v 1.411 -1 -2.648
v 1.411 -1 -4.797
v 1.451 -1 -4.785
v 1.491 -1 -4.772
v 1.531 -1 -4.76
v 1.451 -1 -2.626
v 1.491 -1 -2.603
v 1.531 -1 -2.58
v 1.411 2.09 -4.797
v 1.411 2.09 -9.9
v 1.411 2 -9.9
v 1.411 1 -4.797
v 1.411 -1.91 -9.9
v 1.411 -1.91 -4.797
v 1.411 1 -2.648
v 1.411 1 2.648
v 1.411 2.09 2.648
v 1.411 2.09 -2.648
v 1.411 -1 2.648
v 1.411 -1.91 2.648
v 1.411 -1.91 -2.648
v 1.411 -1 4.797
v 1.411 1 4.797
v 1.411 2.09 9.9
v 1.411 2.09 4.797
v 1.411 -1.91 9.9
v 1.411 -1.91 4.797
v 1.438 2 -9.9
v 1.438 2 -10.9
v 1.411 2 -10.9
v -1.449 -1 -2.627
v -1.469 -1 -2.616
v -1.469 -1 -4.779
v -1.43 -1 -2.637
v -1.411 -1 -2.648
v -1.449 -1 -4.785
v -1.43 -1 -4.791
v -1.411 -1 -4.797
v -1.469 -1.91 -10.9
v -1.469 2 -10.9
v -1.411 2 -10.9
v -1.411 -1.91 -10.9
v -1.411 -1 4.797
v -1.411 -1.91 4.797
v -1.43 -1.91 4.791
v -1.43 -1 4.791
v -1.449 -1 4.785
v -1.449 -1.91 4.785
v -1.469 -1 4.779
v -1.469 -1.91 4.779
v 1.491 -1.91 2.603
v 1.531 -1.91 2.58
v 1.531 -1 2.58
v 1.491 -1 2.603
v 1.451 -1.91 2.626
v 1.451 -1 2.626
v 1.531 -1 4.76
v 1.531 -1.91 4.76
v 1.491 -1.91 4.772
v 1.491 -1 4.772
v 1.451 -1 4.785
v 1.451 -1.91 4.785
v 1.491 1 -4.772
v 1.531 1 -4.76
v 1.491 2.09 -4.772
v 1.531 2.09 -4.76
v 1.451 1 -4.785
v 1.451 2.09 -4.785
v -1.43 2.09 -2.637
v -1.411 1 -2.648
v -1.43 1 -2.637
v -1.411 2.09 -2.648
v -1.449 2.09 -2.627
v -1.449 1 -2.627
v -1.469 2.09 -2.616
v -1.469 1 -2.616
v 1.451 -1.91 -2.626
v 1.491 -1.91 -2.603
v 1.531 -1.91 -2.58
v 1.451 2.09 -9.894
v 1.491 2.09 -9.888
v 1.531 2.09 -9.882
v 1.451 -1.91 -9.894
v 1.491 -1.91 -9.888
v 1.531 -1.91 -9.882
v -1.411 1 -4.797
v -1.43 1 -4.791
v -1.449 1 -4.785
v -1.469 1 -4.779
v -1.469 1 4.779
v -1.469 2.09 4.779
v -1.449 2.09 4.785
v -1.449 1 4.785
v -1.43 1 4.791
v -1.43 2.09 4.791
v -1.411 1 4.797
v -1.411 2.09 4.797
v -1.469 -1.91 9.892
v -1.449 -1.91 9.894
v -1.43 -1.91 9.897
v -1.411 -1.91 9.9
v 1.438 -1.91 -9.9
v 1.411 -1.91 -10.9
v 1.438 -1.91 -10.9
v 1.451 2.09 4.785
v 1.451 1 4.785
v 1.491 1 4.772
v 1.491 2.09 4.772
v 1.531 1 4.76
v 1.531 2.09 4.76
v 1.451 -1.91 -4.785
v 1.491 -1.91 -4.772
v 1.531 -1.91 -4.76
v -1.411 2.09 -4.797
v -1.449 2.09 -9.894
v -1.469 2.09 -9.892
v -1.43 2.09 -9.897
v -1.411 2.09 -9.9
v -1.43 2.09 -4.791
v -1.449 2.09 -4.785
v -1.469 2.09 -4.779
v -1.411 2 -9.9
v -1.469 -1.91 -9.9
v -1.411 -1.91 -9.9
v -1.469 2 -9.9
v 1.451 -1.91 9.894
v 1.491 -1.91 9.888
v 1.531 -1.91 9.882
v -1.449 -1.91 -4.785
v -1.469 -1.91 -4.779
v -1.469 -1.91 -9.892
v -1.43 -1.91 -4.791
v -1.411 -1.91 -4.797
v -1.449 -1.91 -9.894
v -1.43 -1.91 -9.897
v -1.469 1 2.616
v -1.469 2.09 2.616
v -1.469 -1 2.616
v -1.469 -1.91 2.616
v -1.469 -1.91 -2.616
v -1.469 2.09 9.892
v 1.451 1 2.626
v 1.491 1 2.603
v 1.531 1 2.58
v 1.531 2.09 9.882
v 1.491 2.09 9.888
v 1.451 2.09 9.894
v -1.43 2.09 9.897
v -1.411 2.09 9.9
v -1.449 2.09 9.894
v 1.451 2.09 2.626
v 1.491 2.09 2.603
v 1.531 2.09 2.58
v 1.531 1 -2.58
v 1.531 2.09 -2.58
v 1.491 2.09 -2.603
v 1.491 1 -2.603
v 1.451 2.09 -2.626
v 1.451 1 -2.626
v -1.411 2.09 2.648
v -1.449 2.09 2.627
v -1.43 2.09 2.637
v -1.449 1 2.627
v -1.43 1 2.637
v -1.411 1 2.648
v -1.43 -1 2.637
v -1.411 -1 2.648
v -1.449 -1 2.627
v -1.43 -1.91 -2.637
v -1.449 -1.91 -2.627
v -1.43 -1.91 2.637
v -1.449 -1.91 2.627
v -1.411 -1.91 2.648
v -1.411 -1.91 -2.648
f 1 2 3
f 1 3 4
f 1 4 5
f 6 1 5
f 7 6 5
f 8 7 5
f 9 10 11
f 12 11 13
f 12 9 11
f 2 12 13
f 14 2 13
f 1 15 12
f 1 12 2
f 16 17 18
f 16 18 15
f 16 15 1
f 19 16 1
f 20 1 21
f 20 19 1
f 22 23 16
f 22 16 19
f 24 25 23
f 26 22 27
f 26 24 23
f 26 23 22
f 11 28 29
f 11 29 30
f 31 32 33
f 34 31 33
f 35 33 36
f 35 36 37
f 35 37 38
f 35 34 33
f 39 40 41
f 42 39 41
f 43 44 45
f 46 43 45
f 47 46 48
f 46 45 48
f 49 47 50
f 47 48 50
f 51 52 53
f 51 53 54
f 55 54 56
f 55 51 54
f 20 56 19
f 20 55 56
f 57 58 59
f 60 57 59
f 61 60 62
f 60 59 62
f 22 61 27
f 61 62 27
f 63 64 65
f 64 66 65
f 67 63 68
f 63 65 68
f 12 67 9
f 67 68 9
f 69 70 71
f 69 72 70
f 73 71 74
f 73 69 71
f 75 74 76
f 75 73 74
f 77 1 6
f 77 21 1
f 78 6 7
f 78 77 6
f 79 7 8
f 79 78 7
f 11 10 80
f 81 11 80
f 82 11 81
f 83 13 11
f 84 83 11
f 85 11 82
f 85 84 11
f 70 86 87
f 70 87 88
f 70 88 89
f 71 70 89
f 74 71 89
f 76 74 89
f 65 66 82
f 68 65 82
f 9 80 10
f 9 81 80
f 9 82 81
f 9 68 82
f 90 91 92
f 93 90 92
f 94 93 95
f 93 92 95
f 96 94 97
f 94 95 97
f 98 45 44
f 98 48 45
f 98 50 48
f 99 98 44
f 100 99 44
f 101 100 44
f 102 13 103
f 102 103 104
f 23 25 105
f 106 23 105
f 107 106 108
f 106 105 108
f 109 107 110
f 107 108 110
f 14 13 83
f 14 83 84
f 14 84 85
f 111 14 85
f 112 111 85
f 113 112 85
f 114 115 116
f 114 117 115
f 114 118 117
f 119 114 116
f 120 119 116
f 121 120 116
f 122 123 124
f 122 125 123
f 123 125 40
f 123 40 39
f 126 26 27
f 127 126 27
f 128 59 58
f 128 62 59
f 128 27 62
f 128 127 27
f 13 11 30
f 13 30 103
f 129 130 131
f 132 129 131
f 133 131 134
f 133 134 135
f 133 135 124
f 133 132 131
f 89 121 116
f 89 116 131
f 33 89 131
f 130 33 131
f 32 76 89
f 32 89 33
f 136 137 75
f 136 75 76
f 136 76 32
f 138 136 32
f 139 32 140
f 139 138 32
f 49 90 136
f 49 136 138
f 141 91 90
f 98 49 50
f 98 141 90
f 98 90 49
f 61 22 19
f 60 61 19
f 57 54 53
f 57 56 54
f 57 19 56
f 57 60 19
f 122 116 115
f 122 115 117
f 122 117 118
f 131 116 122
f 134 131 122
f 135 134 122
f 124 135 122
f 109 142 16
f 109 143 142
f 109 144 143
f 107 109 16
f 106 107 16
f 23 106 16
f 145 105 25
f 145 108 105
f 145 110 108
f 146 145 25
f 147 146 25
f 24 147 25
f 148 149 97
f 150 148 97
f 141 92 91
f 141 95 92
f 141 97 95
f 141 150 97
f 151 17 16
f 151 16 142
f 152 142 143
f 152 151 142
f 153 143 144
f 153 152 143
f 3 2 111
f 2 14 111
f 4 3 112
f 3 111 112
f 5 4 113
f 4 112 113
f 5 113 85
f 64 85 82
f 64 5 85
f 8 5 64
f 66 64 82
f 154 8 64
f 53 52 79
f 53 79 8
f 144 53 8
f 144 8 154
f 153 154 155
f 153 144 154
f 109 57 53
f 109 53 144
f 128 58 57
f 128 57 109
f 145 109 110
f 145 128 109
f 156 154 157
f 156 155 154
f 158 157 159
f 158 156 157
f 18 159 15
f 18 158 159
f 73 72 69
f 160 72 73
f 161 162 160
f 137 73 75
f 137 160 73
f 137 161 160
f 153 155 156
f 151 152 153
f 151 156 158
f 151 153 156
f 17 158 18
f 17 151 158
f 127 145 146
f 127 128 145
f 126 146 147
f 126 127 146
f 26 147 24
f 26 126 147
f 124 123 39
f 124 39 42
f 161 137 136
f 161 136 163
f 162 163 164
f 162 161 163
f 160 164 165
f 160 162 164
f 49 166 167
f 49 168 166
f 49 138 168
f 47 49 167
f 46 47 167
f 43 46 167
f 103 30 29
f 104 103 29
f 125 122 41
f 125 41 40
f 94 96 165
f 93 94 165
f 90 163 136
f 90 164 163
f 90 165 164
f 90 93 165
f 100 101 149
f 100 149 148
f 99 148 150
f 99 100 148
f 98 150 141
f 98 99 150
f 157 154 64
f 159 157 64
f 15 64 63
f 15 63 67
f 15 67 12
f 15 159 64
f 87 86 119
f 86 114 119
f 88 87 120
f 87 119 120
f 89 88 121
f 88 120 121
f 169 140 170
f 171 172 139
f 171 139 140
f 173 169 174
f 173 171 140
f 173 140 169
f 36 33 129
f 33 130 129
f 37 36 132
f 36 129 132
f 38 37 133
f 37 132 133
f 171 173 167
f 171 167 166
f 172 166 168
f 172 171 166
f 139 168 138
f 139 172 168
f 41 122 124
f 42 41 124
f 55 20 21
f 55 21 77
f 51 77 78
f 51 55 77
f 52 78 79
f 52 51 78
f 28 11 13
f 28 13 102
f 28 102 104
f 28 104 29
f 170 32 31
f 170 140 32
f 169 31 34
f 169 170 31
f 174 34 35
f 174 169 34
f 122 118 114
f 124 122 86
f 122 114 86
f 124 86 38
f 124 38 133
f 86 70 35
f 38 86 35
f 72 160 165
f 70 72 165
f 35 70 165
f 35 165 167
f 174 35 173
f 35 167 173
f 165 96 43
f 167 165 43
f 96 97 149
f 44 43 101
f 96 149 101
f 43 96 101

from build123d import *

# Parameters (mm, degrees)
F0_R      = 10
F1_DEPTH  = 3.175
F2_DEPTH  = 3.175
F3_R      = 5
F3_R_2    = 3
F4_DEPTH  = 2.175
F5_R      = 5
F5_R_2    = 3
F6_DEPTH  = 2.175
F11_DEPTH = 1
F12_DEPTH = 1
F15_DEPTH = 1
F18_DEPTH = 0.75
F19_DEPTH = 3000


with BuildPart() as f1:
    # F0 (on Front) → F1 (new body)
    with BuildSketch(Plane.XZ):
        Circle(F0_R)
    extrude(amount=F1_DEPTH)

    # F0 (on Front) → F2 (join)
    with BuildSketch(Plane.XZ):
        Circle(F0_R)
    extrude(amount=-F2_DEPTH)

    # F3 (on face) → F4 (cut)
    with BuildSketch(Plane.XZ.offset(3.175)):
        Circle(F3_R)
        Circle(F3_R_2, mode=Mode.SUBTRACT)
    extrude(amount=-F4_DEPTH, mode=Mode.SUBTRACT)

    # F5 (on face) → F6 (cut)
    with BuildSketch(Plane(origin=(0, 3.175, 0), x_dir=(-1, 0, 0), z_dir=(0, 1, 0))):
        Circle(F5_R)
        Circle(F5_R_2, mode=Mode.SUBTRACT)
    extrude(amount=-F6_DEPTH, mode=Mode.SUBTRACT)

    # F10 (on offset) → F11 (join)
    with BuildSketch(Plane.XY.offset(9.9)):
        Polygon((-0.4686709089, 2.0901043895), (-1.4686709089, 2.0901043895), (-1.4686709089, -1.9098956105), (-0.4686709089, -1.9098956105), (-0.4686709089, -0.9098956105), (0.5313290911, -0.9098956105), (0.5313290911, -1.9098956105), (1.5313290911, -1.9098956105), (1.5313290911, 2.0901043895), (0.5313290911, 2.0901043895), (0.5313290911, 1.0901043895), (-0.4686709089, 1.0901043895), align=None)
    extrude(amount=F11_DEPTH)

    # F8 (on offset) → F12 (join)
    with BuildSketch(Plane.XY.offset(-9.9)):
        Polygon((-0.5624998019, 2), (-1.5624998019, 2), (-1.5624998019, -2), (-0.5624998019, -2), (-0.5624998019, -1), (0.4375001981, -1), (0.4375001981, -2), (1.4375001981, -2), (1.4375001981, 2), (0.4375001981, 2), (0.4375001981, 1), (-0.5624998019, 1), align=None)
    extrude(amount=-F12_DEPTH)

    # F14 (on offset) → F15 (cut)
    with BuildSketch(Plane.YZ.offset(10)):
        Polygon((-2.2010609162, -0.5056351235), (-2.2010609162, -1.7056351235), (2.1989390838, -1.7056351235), (2.1989390838, -0.5056351235), (0.9989390838, -0.5056351235), (0.9989390838, 0.6943648765), (2.1989390838, 0.6943648765), (2.1989390838, 1.8943648765), (-2.2010609162, 1.8943648765), (-2.2010609162, 0.6943648765), (-1.0010609162, 0.6943648765), (-1.0010609162, -0.5056351235), align=None)
    extrude(amount=-F15_DEPTH, mode=Mode.SUBTRACT)

    # F17 (on offset) → F18 (cut)
    with BuildSketch(Plane.YZ.offset(-10)):
        Polygon((-2.1999866034, -0.5999038326), (-2.1999866034, -1.7999038326), (2.2000133966, -1.7999038326), (2.2000133966, -0.5999038326), (1.0000133966, -0.5999038326), (1.0000133966, 0.6000961674), (2.2000133966, 0.6000961674), (2.2000133966, 1.8000961674), (-2.1999866034, 1.8000961674), (-2.1999866034, 0.6000961674), (-0.9999866034, 0.6000961674), (-0.9999866034, -0.5999038326), align=None)
    extrude(amount=F18_DEPTH, mode=Mode.SUBTRACT)

    # F19 (intersect): faces of the model
    f19_faces = [f1.faces().sort_by_distance(p)[0] for p in [
        (-1.4396722534, 0.0901043895, 9.9),
        (1.4710013446, 0.0901043895, 9.9),
    ]]
    extrude(f19_faces, amount=F19_DEPTH, mode=Mode.INTERSECT)


solid = f1.part
